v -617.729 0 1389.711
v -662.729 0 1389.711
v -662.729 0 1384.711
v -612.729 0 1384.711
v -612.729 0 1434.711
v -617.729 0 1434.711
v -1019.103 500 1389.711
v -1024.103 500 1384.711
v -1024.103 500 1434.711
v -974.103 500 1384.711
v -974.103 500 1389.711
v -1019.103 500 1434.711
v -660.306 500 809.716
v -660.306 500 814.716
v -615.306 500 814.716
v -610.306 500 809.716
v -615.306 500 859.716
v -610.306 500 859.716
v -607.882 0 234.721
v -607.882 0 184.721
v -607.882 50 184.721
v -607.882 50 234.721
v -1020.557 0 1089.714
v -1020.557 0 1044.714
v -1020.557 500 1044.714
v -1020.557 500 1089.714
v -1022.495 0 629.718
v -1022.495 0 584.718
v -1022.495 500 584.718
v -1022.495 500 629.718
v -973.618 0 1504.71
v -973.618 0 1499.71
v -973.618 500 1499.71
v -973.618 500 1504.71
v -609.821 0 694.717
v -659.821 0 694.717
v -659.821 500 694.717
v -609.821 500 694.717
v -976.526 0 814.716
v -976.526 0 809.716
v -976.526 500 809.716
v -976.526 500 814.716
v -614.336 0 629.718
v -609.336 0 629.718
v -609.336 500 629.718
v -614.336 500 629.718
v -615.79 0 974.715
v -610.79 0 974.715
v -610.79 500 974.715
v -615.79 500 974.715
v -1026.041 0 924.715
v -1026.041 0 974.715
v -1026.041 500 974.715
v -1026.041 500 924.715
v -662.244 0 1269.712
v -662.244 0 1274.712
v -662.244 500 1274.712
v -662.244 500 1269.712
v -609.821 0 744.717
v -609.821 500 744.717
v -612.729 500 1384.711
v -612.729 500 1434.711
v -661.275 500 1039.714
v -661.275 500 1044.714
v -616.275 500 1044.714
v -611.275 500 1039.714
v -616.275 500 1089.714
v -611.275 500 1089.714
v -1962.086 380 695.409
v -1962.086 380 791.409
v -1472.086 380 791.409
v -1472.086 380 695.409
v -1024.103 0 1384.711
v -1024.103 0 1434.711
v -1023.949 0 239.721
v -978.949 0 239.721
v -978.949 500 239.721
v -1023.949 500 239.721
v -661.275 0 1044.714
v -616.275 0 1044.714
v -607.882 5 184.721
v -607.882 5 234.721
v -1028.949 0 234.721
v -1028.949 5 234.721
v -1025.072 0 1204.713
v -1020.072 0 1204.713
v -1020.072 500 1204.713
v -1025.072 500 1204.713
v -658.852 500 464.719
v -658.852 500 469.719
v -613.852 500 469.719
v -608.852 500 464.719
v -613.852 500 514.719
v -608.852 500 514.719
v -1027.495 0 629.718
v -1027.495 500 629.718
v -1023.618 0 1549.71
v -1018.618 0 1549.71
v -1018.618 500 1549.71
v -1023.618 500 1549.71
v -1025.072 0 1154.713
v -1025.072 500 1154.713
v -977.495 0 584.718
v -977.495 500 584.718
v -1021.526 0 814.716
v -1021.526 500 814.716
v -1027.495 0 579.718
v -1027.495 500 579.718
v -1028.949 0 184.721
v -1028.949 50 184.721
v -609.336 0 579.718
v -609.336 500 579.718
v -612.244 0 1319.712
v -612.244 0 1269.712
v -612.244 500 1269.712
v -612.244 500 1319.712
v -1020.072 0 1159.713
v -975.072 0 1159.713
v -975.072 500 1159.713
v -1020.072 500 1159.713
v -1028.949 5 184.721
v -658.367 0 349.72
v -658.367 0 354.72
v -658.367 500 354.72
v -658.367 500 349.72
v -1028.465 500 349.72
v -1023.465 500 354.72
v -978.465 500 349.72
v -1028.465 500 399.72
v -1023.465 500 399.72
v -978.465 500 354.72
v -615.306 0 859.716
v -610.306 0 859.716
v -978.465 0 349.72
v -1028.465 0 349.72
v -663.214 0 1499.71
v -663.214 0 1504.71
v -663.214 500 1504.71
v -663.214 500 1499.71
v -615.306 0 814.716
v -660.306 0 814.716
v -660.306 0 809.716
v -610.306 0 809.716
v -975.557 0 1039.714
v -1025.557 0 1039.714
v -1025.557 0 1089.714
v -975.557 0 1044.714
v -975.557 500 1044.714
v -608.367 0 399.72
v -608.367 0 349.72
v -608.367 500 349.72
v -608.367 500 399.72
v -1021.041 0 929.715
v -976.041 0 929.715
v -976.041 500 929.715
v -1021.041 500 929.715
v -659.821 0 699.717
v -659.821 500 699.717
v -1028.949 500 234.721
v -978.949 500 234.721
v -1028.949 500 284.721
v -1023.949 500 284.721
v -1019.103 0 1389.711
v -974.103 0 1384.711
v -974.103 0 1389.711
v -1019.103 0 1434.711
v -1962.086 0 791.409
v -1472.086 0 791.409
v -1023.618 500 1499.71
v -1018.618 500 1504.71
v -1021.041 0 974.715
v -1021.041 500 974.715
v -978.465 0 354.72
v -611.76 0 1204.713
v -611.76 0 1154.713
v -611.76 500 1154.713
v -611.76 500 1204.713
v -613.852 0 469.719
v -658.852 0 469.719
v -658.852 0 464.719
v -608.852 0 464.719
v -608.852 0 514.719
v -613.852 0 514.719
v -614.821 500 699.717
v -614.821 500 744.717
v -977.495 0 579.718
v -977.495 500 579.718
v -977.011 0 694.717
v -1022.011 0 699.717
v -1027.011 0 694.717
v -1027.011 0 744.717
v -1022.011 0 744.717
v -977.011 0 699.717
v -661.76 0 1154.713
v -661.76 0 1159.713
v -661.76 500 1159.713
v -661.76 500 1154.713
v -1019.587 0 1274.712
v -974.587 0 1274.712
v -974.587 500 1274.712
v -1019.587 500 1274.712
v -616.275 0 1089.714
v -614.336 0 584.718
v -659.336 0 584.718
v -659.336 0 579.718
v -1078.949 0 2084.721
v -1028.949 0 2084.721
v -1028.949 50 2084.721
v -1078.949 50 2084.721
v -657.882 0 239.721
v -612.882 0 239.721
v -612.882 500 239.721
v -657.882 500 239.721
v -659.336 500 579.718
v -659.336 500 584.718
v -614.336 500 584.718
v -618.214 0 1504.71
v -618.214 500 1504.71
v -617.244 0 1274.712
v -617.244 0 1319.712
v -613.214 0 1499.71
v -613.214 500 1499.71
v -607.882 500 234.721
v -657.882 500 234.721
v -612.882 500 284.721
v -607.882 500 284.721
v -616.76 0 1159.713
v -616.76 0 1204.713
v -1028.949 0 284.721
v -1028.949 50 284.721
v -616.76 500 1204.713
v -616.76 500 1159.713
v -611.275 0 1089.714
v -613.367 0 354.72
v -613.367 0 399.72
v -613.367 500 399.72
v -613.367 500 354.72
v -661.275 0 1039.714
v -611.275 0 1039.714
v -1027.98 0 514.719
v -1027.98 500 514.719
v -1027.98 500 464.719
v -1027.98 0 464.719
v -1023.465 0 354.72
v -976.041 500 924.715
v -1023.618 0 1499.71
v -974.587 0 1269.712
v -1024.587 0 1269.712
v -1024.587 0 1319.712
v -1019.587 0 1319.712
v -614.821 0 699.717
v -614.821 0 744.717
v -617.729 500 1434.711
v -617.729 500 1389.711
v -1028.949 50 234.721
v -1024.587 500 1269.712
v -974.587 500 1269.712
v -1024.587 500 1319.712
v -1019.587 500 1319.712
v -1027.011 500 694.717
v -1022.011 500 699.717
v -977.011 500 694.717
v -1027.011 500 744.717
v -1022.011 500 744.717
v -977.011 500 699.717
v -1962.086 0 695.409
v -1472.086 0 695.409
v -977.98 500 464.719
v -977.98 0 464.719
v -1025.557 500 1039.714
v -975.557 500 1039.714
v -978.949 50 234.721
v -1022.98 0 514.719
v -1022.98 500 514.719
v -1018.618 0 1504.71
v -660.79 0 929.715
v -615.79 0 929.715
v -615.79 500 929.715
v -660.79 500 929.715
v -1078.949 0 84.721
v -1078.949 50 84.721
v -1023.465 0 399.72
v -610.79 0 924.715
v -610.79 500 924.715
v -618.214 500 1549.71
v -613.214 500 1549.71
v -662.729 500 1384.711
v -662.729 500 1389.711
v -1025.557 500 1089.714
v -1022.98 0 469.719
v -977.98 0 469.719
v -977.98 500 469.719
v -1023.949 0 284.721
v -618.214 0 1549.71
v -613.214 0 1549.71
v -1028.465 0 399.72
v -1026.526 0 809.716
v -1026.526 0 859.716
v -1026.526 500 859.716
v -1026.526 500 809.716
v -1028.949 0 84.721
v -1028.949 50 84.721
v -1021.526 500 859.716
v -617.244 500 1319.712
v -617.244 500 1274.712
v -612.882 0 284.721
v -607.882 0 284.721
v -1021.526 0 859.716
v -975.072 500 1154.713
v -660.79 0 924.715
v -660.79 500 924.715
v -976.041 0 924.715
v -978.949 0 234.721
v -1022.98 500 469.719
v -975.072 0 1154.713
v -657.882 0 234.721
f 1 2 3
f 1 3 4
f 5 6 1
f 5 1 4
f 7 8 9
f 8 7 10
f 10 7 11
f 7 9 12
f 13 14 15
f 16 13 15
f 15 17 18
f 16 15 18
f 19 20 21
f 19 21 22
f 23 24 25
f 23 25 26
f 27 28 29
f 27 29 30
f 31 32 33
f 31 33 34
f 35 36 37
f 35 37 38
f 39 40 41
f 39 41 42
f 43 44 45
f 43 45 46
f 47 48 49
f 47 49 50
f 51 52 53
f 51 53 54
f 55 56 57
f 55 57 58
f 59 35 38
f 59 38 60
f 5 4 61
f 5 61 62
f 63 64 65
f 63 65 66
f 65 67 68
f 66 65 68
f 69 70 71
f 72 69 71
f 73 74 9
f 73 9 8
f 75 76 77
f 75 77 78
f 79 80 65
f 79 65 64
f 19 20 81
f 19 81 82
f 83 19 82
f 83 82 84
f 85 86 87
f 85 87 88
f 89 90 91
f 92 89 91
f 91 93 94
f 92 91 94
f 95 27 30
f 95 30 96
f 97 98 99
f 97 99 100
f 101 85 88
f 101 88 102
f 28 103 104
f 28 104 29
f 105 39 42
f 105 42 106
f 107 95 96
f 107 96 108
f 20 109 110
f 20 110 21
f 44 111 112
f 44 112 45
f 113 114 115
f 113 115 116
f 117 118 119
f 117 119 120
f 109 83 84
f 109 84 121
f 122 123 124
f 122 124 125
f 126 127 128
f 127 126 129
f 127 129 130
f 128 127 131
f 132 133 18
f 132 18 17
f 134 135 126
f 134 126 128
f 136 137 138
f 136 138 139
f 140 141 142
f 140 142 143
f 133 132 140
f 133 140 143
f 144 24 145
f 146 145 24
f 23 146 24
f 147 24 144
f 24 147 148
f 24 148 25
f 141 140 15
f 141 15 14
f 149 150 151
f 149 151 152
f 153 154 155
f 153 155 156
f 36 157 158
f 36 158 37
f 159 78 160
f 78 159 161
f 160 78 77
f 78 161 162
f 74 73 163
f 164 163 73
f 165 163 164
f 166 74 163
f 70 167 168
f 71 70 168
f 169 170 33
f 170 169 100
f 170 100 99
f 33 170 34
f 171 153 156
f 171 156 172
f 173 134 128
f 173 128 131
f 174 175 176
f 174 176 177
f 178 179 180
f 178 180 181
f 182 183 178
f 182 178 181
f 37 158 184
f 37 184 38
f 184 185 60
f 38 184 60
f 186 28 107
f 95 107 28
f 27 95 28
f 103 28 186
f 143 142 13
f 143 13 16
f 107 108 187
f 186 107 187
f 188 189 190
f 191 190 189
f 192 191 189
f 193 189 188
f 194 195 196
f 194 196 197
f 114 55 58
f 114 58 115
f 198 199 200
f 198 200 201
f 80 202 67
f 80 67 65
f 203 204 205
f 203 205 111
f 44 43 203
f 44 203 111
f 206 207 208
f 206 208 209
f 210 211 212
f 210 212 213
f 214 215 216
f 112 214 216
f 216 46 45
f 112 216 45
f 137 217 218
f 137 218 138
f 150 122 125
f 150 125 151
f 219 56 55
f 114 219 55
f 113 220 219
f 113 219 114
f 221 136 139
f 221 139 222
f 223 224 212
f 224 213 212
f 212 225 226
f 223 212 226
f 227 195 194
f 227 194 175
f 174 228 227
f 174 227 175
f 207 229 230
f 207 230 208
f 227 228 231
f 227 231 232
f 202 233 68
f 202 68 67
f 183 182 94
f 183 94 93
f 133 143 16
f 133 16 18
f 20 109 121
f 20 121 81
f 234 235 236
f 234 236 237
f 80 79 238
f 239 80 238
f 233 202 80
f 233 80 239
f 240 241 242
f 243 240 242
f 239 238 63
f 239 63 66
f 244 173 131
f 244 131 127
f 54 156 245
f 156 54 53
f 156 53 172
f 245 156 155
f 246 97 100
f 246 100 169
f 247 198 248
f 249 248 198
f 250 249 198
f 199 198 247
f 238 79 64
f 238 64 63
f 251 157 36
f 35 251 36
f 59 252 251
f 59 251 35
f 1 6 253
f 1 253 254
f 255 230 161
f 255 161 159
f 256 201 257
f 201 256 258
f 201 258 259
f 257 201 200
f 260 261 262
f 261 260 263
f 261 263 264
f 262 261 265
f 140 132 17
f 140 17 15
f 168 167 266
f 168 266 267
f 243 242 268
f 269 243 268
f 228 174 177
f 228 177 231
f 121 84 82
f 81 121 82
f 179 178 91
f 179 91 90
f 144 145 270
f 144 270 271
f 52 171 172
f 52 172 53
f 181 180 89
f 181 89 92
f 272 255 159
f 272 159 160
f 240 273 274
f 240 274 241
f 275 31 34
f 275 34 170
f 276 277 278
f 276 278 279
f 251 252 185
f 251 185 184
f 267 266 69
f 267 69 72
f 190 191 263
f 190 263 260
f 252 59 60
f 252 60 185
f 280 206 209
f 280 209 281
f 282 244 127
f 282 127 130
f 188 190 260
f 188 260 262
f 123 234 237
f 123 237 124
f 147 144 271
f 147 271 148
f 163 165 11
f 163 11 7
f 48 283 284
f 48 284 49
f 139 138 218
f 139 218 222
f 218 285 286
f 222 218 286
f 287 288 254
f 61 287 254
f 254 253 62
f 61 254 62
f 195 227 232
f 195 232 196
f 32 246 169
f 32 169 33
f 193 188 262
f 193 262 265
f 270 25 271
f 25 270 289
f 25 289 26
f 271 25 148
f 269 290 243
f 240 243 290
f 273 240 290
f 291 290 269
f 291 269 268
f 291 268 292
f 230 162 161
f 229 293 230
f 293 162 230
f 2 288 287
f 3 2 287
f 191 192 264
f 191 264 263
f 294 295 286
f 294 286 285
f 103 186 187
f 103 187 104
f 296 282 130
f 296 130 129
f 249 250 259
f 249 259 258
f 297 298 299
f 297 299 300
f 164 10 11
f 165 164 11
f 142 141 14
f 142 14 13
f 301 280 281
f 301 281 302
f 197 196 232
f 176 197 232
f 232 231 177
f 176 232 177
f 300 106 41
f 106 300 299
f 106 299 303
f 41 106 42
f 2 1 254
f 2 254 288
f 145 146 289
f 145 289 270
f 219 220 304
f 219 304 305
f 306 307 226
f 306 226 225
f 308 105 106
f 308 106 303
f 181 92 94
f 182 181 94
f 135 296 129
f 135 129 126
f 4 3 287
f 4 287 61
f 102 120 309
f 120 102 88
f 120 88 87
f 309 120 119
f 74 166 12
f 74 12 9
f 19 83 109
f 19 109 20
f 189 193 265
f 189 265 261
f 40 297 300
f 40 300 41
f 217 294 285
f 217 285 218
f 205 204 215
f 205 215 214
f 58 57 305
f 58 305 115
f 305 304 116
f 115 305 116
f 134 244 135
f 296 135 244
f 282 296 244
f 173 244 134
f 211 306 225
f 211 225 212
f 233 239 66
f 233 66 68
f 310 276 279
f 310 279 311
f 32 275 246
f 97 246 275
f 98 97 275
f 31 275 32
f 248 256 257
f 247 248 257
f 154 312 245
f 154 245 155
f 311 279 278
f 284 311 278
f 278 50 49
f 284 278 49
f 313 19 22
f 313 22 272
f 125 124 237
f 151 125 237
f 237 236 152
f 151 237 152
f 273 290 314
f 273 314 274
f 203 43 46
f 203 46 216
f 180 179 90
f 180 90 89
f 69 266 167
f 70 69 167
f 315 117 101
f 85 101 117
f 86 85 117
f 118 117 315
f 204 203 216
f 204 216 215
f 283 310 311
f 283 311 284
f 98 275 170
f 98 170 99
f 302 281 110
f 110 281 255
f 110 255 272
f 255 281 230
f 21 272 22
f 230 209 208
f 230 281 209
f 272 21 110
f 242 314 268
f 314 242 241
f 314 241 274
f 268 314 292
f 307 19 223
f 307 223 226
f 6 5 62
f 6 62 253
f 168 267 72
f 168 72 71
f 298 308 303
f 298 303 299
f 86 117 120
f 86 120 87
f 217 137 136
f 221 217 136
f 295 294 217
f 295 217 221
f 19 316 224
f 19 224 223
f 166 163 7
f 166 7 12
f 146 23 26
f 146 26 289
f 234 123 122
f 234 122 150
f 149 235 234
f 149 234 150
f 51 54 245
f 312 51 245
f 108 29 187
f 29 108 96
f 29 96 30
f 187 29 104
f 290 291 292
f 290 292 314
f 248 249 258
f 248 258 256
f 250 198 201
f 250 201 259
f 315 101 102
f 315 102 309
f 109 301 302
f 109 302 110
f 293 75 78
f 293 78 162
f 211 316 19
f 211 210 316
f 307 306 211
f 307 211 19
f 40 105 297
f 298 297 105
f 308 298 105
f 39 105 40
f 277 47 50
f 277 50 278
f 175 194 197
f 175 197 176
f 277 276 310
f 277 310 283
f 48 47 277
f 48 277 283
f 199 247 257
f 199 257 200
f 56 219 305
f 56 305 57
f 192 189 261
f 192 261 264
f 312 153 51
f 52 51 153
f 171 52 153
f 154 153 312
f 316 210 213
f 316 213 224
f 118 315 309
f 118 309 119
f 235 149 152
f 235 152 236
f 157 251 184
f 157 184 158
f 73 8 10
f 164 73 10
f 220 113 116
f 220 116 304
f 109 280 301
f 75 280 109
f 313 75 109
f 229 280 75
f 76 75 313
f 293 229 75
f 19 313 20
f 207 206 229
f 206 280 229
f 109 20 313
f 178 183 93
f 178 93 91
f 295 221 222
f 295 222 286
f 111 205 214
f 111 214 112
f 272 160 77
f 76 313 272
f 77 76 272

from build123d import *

# Parameters (mm, degrees)
F1_DEPTH = 500
F2_DEPTH = 50
F3_DEPTH = 5
F4_W     = 490
F4_H     = 96
F5_DEPTH = 380


with BuildPart() as f1:
    # F0 (on Front) → F1 (new body)
    with BuildSketch(Plane.XZ):
        Polygon((-618.2137493553, 1549.7096652101), (-618.2137493553, 1504.7096652101), (-663.2137493553, 1504.7096652101), (-663.2137493553, 1499.7096652101), (-613.2137493553, 1499.7096652101), (-613.2137493553, 1549.7096652101), align=None)
    extrude(amount=-F1_DEPTH)


with BuildPart() as f1b:
    # F0 (on Front) → F1, piece 2 (new body)
    with BuildSketch(Plane.XZ):
        Polygon((-611.2749996911, 1089.7137508263), (-616.2749996911, 1089.7137508263), (-616.2749996911, 1044.7137508263), (-661.2749996911, 1044.7137508263), (-661.2749996911, 1039.7137508263), (-611.2749996911, 1039.7137508263), align=None)
    extrude(amount=-F1_DEPTH)


with BuildPart() as f1c:
    # F0 (on Front) → F1, piece 3 (new body)
    with BuildSketch(Plane.XZ):
        Polygon((-662.7290619393, 1389.7106866141), (-662.7290619393, 1384.7106866142), (-612.7290619393, 1384.7106866142), (-612.7290619393, 1434.7106866142), (-617.7290619393, 1434.7106866142), (-617.7290619393, 1389.7106866142), align=None)
    extrude(amount=-F1_DEPTH)


with BuildPart() as f1d:
    # F0 (on Front) → F1, piece 4 (new body)
    with BuildSketch(Plane.XZ):
        Polygon((-612.2443745232, 1319.7117080182), (-617.2443745232, 1319.7117080182), (-617.2443745232, 1274.7117080182), (-662.2443745232, 1274.7117080182), (-662.2443745232, 1269.7117080182), (-612.2443745232, 1269.7117080182), align=None)
    extrude(amount=-F1_DEPTH)


with BuildPart() as f1e:
    # F0 (on Front) → F1, piece 5 (new body)
    with BuildSketch(Plane.XZ):
        Polygon((-611.7596871071, 1154.7127294223), (-611.7596871071, 1204.7127294223), (-616.7596871071, 1204.7127294223), (-616.7596871071, 1159.7127294223), (-661.7596871071, 1159.7127294223), (-661.7596871071, 1154.7127294223), align=None)
    extrude(amount=-F1_DEPTH)


with BuildPart() as f1f:
    # F0 (on Front) → F1, piece 6 (new body)
    with BuildSketch(Plane.XZ):
        Polygon((-659.3362500268, 584.7178364426), (-659.3362500268, 579.7178364426), (-609.3362500268, 579.7178364426), (-609.3362500268, 629.7178364426), (-614.3362500268, 629.7178364426), (-614.3362500268, 584.7178364426), align=None)
    extrude(amount=-F1_DEPTH)


with BuildPart() as f1g:
    # F0 (on Front) → F1, piece 7 (new body)
    with BuildSketch(Plane.XZ):
        Polygon((-660.305624859, 814.7157936345), (-660.305624859, 809.7157936345), (-610.305624859, 809.7157936345), (-610.305624859, 859.7157936345), (-615.305624859, 859.7157936345), (-615.305624859, 814.7157936345), align=None)
    extrude(amount=-F1_DEPTH)


with BuildPart() as f1h:
    # F0 (on Front) → F1, piece 8 (new body)
    with BuildSketch(Plane.XZ):
        Polygon((-609.8209374429, 744.7168150385), (-614.8209374429, 744.7168150385), (-614.8209374429, 699.7168150385), (-659.8209374429, 699.7168150385), (-659.8209374429, 694.7168150385), (-609.8209374429, 694.7168150385), align=None)
    extrude(amount=-F1_DEPTH)


with BuildPart() as f1i:
    # F0 (on Front) → F1, piece 9 (new body)
    with BuildSketch(Plane.XZ):
        Polygon((-658.8515626108, 469.7188578467), (-658.8515626108, 464.7188578467), (-608.8515626108, 464.7188578467), (-608.8515626108, 514.7188578467), (-613.8515626108, 514.7188578467), (-613.8515626108, 469.7188578467), align=None)
    extrude(amount=-F1_DEPTH)


with BuildPart() as f1j:
    # F0 (on Front) → F1, piece 10 (new body)
    with BuildSketch(Plane.XZ):
        Polygon((-660.790312275, 929.7147722304), (-660.790312275, 924.7147722304), (-610.790312275, 924.7147722304), (-610.790312275, 974.7147722304), (-615.790312275, 974.7147722304), (-615.790312275, 929.7147722304), align=None)
    extrude(amount=-F1_DEPTH)


with BuildPart() as f1k:
    # F0 (on Front) → F1, piece 11 (new body)
    with BuildSketch(Plane.XZ):
        Polygon((-658.3668751947, 354.7198792507), (-658.3668751947, 349.7198792507), (-608.3668751947, 349.7198792507), (-608.3668751947, 399.7198792507), (-613.3668751947, 399.7198792507), (-613.3668751947, 354.7198792507), align=None)
    extrude(amount=-F1_DEPTH)


with BuildPart() as f1l:
    # F0 (on Front) → F1, piece 12 (new body)
    with BuildSketch(Plane.XZ):
        Polygon((-1018.6178918419, 1549.7096652101), (-1023.6178918419, 1549.7096652101), (-1023.6178918419, 1499.7096652101), (-973.6178918419, 1499.7096652101), (-973.6178918419, 1504.7096652101), (-1018.6178918419, 1504.7096652101), align=None)
    extrude(amount=-F1_DEPTH)


with BuildPart() as f1m:
    # F0 (on Front) → F1, piece 13 (new body)
    with BuildSketch(Plane.XZ):
        Polygon((-1019.1025792579, 1434.7106866142), (-1024.1025792579, 1434.7106866142), (-1024.1025792579, 1384.7106866142), (-974.1025792579, 1384.7106866142), (-974.1025792579, 1389.7106866141), (-1019.1025792579, 1389.7106866142), align=None)
    extrude(amount=-F1_DEPTH)


with BuildPart() as f1n:
    # F0 (on Front) → F1, piece 14 (new body)
    with BuildSketch(Plane.XZ):
        Polygon((-1028.9494534186, 284.7209006548), (-1028.9494534186, 234.7209006548), (-978.9494534186, 234.7209006548), (-978.9494534186, 239.7209006548), (-1023.9494534186, 239.7209006548), (-1023.9494534186, 284.7209006548), align=None)
    extrude(amount=-F1_DEPTH)

    # F0 (on Front) → F2 (join)
    with BuildSketch(Plane.XZ):
        Polygon((-1078.9494534186, 2084.7209006548), (-1078.9494534186, 84.7209006548), (-1028.9494534186, 84.7209006548), (-1028.9494534186, 184.7209006548), (-1028.9494534186, 234.7209006548), (-1028.9494534186, 284.7209006548), (-1028.9494534186, 2034.7209006548), (-1028.9494534186, 2084.7209006548), align=None)
        Polygon((-1028.9494534186, 234.7209006548), (-1028.9494534186, 184.7209006548), (-607.8821877786, 184.7209006548), (-607.8821877786, 234.7209006548), (-657.8821877786, 234.7209006548), (-978.9494534186, 234.7209006548), align=None)
    extrude(amount=-F2_DEPTH)


with BuildPart() as f1o:
    # F0 (on Front) → F1, piece 15 (new body)
    with BuildSketch(Plane.XZ):
        Polygon((-1023.4647660025, 399.7198792507), (-1028.4647660025, 399.7198792507), (-1028.4647660025, 349.7198792507), (-978.4647660025, 349.7198792507), (-978.4647660025, 354.7198792507), (-1023.4647660025, 354.7198792507), align=None)
    extrude(amount=-F1_DEPTH)


with BuildPart() as f1p:
    # F0 (on Front) → F1, piece 16 (new body)
    with BuildSketch(Plane.XZ):
        Polygon((-657.8821877786, 234.7209006548), (-607.8821877786, 234.7209006548), (-607.8821877786, 284.7209006548), (-612.8821877786, 284.7209006548), (-612.8821877786, 239.7209006548), (-657.8821877786, 239.7209006548), align=None)
    extrude(amount=-F1_DEPTH)


with BuildPart() as f1q:
    # F0 (on Front) → F1, piece 17 (new body)
    with BuildSketch(Plane.XZ):
        Polygon((-1022.9800785864, 514.7188578467), (-1027.9800785864, 514.7188578467), (-1027.9800785864, 464.7188578467), (-977.9800785864, 464.7188578467), (-977.9800785864, 469.7188578467), (-1022.9800785864, 469.7188578467), align=None)
    extrude(amount=-F1_DEPTH)


with BuildPart() as f1r:
    # F0 (on Front) → F1, piece 18 (new body)
    with BuildSketch(Plane.XZ):
        Polygon((-1022.4953911704, 629.7178364426), (-1027.4953911704, 629.7178364426), (-1027.4953911704, 579.7178364426), (-977.4953911704, 579.7178364426), (-977.4953911704, 584.7178364426), (-1022.4953911704, 584.7178364426), align=None)
    extrude(amount=-F1_DEPTH)


with BuildPart() as f1s:
    # F0 (on Front) → F1, piece 19 (new body)
    with BuildSketch(Plane.XZ):
        Polygon((-1022.0107037543, 744.7168150385), (-1027.0107037543, 744.7168150385), (-1027.0107037543, 694.7168150385), (-977.0107037543, 694.7168150385), (-977.0107037543, 699.7168150385), (-1022.0107037543, 699.7168150385), align=None)
    extrude(amount=-F1_DEPTH)


with BuildPart() as f1t:
    # F0 (on Front) → F1, piece 20 (new body)
    with BuildSketch(Plane.XZ):
        Polygon((-1021.5260163382, 859.7157936345), (-1026.5260163382, 859.7157936345), (-1026.5260163382, 809.7157936345), (-976.5260163382, 809.7157936345), (-976.5260163382, 814.7157936345), (-1021.5260163382, 814.7157936345), align=None)
    extrude(amount=-F1_DEPTH)


with BuildPart() as f1u:
    # F0 (on Front) → F1, piece 21 (new body)
    with BuildSketch(Plane.XZ):
        Polygon((-1019.587266674, 1319.7117080182), (-1024.587266674, 1319.7117080182), (-1024.587266674, 1269.7117080182), (-974.587266674, 1269.7117080182), (-974.587266674, 1274.7117080182), (-1019.587266674, 1274.7117080182), align=None)
    extrude(amount=-F1_DEPTH)


with BuildPart() as f1v:
    # F0 (on Front) → F1, piece 22 (new body)
    with BuildSketch(Plane.XZ):
        Polygon((-1020.0719540901, 1204.7127294223), (-1025.0719540901, 1204.7127294223), (-1025.0719540901, 1154.7127294223), (-975.0719540901, 1154.7127294223), (-975.0719540901, 1159.7127294223), (-1020.0719540901, 1159.7127294223), align=None)
    extrude(amount=-F1_DEPTH)


with BuildPart() as f1w:
    # F0 (on Front) → F1, piece 23 (new body)
    with BuildSketch(Plane.XZ):
        Polygon((-1020.5566415061, 1089.7137508263), (-1025.5566415061, 1089.7137508263), (-1025.5566415061, 1039.7137508263), (-975.5566415061, 1039.7137508263), (-975.5566415061, 1044.7137508263), (-1020.5566415061, 1044.7137508263), align=None)
    extrude(amount=-F1_DEPTH)


with BuildPart() as f1x:
    # F0 (on Front) → F1, piece 24 (new body)
    with BuildSketch(Plane.XZ):
        Polygon((-1021.0413289222, 974.7147722304), (-1026.0413289222, 974.7147722304), (-1026.0413289222, 924.7147722304), (-976.0413289222, 924.7147722304), (-976.0413289222, 929.7147722304), (-1021.0413289222, 929.7147722304), align=None)
    extrude(amount=-F1_DEPTH)


with BuildPart() as f3:
    # F0 (on Front) → F3 (new body)
    with BuildSketch(Plane.XZ):
        Polygon((-1028.9494534186, 234.7209006548), (-1028.9494534186, 184.7209006548), (-607.8821877786, 184.7209006548), (-607.8821877786, 234.7209006548), (-657.8821877786, 234.7209006548), (-978.9494534186, 234.7209006548), align=None)
    extrude(amount=-F3_DEPTH)


with BuildPart() as f5:
    # F4 (on Front) → F5 (new body)
    with BuildSketch(Plane.XZ):
        with Locations((-1717.0861363411, 743.4093228319)):
            Rectangle(F4_W, F4_H)
    extrude(amount=-F5_DEPTH)


solid = Compound([f1.part, f1b.part, f1c.part, f1d.part, f1e.part, f1f.part, f1g.part, f1h.part, f1i.part, f1j.part, f1k.part, f1l.part, f1m.part, f1n.part, f1o.part, f1p.part, f1q.part, f1r.part, f1s.part, f1t.part, f1u.part, f1v.part, f1w.part, f1x.part, f3.part, f5.part])
